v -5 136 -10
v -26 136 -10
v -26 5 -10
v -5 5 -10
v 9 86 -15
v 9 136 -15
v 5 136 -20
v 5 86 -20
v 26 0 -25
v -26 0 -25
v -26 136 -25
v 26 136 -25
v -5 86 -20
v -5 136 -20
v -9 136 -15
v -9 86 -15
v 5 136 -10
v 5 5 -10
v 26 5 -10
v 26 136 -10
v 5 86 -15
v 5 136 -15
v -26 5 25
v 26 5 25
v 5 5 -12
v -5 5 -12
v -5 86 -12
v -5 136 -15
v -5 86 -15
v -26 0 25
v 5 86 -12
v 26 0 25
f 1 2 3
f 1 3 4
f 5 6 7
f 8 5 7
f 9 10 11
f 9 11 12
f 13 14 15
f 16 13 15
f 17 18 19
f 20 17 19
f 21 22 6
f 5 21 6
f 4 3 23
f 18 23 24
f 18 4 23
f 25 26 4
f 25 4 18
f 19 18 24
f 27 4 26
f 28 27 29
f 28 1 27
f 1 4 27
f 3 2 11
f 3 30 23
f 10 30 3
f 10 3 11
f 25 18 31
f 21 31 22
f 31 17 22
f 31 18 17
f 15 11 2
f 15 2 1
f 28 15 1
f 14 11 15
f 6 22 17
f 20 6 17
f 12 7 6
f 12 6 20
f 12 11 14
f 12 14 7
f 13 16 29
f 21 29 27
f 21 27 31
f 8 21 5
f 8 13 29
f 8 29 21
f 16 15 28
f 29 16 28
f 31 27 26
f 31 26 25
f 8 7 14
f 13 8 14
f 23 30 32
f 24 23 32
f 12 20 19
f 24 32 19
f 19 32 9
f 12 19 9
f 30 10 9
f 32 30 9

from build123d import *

# Parameters (mm, degrees)
SKETCH1_W           = 52
SKETCH1_H           = 50
BOSS_EXTRUDE1_DEPTH = 5
SKETCH2_W           = 52
SKETCH2_H           = 15
BOSS_EXTRUDE2_DEPTH = 131
CUT_EXTRUDE1_DEPTH  = 50
SKETCH4_W           = 10
SKETCH4_H           = 2
CUT_EXTRUDE2_DEPTH  = 81


with BuildPart() as part:
    # Sketch1 → Boss-Extrude1 (new body)
    with BuildSketch(Plane(origin=(0, 0, 0), x_dir=(1, 0, 0), z_dir=(0, 1, 0))):
        Rectangle(SKETCH1_W, SKETCH1_H)
    extrude(amount=BOSS_EXTRUDE1_DEPTH)

    # Sketch2 → Boss-Extrude2 (add)
    with BuildSketch(Plane(origin=(0, 5, 0), x_dir=(1, 0, 0), z_dir=(0, 1, 0))):
        with Locations((0, 17.5)):
            Rectangle(SKETCH2_W, SKETCH2_H)
    extrude(amount=BOSS_EXTRUDE2_DEPTH)

    # Sketch3 → Cut-Extrude1 (cut)
    with BuildSketch(Plane(origin=(0, 136, 0), x_dir=(1, 0, 0), z_dir=(0, 1, 0))):
        Polygon((-5, 10), (5, 10), (5, 15), (9, 15), (5, 20), (-5, 20), (-9, 15), (-5, 15), align=None)
    extrude(amount=-CUT_EXTRUDE1_DEPTH, mode=Mode.SUBTRACT)

    # Sketch4 → Cut-Extrude2 (cut)
    with BuildSketch(Plane(origin=(0, 86, 0), x_dir=(1, 0, 0), z_dir=(0, 1, 0))):
        with Locations((0, 11)):
            Rectangle(SKETCH4_W, SKETCH4_H)
    extrude(amount=-CUT_EXTRUDE2_DEPTH, mode=Mode.SUBTRACT)


solid = part.part
